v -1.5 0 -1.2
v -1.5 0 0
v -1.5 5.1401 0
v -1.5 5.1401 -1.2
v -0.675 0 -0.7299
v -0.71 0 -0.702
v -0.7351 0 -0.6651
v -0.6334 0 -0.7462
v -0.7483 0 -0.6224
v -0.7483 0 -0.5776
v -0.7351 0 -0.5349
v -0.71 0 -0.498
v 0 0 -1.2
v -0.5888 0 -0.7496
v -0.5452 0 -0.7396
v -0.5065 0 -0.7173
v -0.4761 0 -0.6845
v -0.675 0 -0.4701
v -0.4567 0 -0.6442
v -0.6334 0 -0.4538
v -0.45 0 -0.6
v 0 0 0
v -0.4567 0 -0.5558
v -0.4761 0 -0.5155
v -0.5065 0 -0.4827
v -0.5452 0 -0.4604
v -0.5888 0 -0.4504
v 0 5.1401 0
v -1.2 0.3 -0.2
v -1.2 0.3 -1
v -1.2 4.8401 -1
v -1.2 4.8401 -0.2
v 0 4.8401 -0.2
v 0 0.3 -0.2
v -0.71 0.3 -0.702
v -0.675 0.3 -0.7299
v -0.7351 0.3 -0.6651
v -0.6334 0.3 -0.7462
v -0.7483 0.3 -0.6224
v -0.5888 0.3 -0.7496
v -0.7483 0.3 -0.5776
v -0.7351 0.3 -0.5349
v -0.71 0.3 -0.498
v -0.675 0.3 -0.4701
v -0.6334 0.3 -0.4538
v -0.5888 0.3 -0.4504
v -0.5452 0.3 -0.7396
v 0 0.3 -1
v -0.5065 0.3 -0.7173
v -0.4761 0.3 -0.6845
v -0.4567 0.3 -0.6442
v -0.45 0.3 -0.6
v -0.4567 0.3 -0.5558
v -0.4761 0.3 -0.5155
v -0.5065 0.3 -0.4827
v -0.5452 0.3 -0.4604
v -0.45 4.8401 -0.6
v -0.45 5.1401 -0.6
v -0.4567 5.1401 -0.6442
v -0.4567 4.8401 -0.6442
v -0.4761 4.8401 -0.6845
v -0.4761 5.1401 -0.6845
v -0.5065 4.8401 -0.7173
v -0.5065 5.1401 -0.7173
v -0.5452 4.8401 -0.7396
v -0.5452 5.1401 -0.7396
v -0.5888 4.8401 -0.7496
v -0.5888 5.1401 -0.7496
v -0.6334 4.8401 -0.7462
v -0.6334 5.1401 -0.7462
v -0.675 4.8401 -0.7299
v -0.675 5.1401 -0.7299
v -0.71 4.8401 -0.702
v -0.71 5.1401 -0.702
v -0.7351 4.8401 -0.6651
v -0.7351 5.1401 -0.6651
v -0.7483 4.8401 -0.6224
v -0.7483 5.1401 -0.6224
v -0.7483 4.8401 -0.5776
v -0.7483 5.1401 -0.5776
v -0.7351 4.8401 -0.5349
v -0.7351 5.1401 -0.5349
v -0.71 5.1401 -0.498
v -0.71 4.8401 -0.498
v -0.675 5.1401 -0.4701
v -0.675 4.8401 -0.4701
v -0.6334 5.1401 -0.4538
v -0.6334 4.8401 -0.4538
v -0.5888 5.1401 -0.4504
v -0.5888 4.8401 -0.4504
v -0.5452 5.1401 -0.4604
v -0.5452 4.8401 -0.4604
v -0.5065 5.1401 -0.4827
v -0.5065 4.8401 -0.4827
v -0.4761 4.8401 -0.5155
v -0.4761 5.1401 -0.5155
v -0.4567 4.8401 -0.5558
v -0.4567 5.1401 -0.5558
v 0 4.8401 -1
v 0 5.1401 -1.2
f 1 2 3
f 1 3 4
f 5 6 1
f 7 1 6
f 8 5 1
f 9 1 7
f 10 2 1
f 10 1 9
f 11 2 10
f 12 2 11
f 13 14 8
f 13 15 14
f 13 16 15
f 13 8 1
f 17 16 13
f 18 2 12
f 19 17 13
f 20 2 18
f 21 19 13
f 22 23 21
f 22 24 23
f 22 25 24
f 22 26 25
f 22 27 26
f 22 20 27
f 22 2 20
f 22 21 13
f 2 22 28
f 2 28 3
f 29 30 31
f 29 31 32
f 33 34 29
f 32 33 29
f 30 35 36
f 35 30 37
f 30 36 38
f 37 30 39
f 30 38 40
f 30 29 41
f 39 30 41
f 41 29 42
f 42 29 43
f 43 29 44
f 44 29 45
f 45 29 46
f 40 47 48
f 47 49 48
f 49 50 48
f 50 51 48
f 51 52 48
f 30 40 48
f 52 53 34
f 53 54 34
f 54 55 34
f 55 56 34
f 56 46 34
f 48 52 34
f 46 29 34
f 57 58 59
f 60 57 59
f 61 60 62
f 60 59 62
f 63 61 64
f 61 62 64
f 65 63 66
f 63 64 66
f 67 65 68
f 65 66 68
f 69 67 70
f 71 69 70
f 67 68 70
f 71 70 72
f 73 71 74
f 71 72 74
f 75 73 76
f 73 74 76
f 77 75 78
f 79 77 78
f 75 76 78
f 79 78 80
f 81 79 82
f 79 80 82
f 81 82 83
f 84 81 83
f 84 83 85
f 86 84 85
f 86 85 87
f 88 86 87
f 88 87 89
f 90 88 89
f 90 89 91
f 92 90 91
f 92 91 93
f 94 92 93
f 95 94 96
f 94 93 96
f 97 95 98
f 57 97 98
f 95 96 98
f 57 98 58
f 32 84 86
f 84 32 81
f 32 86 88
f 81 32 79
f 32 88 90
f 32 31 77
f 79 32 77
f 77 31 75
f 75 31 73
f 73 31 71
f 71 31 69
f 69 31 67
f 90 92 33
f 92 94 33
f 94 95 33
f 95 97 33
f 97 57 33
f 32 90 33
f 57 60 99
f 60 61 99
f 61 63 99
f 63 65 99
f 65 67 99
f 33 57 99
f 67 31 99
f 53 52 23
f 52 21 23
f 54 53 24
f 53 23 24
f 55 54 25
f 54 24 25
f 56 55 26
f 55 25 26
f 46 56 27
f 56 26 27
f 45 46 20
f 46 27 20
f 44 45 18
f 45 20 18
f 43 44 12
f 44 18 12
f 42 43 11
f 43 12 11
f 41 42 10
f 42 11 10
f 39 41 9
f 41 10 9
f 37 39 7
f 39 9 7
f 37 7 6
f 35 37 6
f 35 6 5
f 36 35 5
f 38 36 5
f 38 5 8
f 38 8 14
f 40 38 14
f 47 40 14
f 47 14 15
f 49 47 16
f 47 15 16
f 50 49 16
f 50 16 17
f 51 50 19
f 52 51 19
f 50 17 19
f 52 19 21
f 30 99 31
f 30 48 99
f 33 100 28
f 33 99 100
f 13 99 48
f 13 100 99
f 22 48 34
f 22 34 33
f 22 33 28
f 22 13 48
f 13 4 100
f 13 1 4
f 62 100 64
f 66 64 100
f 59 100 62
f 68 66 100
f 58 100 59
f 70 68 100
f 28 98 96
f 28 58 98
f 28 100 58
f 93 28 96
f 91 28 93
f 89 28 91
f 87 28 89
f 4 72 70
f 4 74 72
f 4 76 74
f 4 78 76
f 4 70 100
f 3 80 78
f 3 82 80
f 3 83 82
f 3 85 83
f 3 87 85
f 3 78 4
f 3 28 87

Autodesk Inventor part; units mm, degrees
ref_plane "YZ Plane" through (0, 0, 0) normal (1, 0, 0) x (0, 1, 0)
ref_plane "XZ Plane" through (0, 0, 0) normal (0, 1, 0) x (-1, 0, 0)
ref_plane "XY Plane" through (0, 0, 0) normal (0, 0, 1) x (1, 0, 0)
sketch "Boceto1" plane through (0, 0, 0) normal (0, 1, 0) x (-1, 0, 0)
  line L0 (0, 0) -> (0, -1.2)
  line L1 (0, -1.2) -> (1.2, -1.2)
  line L2 (1.2, -1) -> (1.2, -0.2)
  circle A0 centre (0.9, -0.6) radius 0.15
  circle A1 centre (0.3, -0.6) radius 0.15
  line L3 (0, 0) -> (1.5, 0)
  line L4 (1.5, 0) -> (1.5, -1.2)
  line L5 (1.5, -1.2) -> (0, -1.2)
  line L6 (0, 0) -> (0, -0.2)
  line L7 (0, -0.2) -> (1.2, -0.2)
  line L8 (0, -1.2) -> (0, -1)
  line L9 (0, -1) -> (1.2, -1)
  line L10 (0, 0) -> (0, -0.2)
  line L11 (0, -1) -> (0, -1.2)
  dimension "d0" = 1.2
  dimension "d1" = 1.2
  dimension "d3" = 0.3
  dimension "d4" = 0.3
  dimension "d5" = 1.5
  dimension "d6" = 1.2
  dimension "d7" = 0.2
  dimension "d8" = 0.2
extrude "Extrusión1" add sketch "Boceto1" along normal blind 5.1401 contours L3 L4 L5 L1 L0 L9 L2 L7
sketch "Boceto5" plane through (0, 5.1401, 0) normal (0, 1, 0) x (1, 0, 0)
  line L0 (0, 0.2) -> (0, 1)
  line L1 (-1.2, 1) -> (0, 1)
  line L2 (-1.2, 0.2) -> (0, 0.2)
  circle A0 centre (-0.6, 0.6) radius 0.15
  line L3 (0, 0.2) -> (-1.2, 0.2) projected
  line L4 (-1.2, 1) -> (0, 1) projected
  line L5 (-1.2, 0.2) -> (-1.2, 1) projected
  line L6 (0, 0) -> (0, 0.2) projected
  line L7 (0, 1) -> (0, 0.2)
extrude "Extrusión4" add sketch "Boceto5" against normal blind 0.3
sketch "Boceto6" plane through (0, 0, 0) normal (0, -1, 0) x (1, 0, 0)
  circle A0 centre (-0.6, -0.6) radius 0.15 projected
  line L0 (-1.2, -0.2) -> (0, -0.2) projected
  line L1 (-1.2, -1) -> (-1.2, -0.2) projected
  line L2 (0, -1) -> (-1.2, -1) projected
  line L3 (0, -1) -> (0, -0.2) projected
  point P0 (0, 0)
extrude "Extrusión5" add sketch "Boceto6" against normal blind 0.3
sketch "Boceto8" plane through (-1.5, 0, 0) normal (0, 0, 1) x (1, 0, 0)
  point P0 (1.5, 0)
properties part number "pilarSoporteLED"
